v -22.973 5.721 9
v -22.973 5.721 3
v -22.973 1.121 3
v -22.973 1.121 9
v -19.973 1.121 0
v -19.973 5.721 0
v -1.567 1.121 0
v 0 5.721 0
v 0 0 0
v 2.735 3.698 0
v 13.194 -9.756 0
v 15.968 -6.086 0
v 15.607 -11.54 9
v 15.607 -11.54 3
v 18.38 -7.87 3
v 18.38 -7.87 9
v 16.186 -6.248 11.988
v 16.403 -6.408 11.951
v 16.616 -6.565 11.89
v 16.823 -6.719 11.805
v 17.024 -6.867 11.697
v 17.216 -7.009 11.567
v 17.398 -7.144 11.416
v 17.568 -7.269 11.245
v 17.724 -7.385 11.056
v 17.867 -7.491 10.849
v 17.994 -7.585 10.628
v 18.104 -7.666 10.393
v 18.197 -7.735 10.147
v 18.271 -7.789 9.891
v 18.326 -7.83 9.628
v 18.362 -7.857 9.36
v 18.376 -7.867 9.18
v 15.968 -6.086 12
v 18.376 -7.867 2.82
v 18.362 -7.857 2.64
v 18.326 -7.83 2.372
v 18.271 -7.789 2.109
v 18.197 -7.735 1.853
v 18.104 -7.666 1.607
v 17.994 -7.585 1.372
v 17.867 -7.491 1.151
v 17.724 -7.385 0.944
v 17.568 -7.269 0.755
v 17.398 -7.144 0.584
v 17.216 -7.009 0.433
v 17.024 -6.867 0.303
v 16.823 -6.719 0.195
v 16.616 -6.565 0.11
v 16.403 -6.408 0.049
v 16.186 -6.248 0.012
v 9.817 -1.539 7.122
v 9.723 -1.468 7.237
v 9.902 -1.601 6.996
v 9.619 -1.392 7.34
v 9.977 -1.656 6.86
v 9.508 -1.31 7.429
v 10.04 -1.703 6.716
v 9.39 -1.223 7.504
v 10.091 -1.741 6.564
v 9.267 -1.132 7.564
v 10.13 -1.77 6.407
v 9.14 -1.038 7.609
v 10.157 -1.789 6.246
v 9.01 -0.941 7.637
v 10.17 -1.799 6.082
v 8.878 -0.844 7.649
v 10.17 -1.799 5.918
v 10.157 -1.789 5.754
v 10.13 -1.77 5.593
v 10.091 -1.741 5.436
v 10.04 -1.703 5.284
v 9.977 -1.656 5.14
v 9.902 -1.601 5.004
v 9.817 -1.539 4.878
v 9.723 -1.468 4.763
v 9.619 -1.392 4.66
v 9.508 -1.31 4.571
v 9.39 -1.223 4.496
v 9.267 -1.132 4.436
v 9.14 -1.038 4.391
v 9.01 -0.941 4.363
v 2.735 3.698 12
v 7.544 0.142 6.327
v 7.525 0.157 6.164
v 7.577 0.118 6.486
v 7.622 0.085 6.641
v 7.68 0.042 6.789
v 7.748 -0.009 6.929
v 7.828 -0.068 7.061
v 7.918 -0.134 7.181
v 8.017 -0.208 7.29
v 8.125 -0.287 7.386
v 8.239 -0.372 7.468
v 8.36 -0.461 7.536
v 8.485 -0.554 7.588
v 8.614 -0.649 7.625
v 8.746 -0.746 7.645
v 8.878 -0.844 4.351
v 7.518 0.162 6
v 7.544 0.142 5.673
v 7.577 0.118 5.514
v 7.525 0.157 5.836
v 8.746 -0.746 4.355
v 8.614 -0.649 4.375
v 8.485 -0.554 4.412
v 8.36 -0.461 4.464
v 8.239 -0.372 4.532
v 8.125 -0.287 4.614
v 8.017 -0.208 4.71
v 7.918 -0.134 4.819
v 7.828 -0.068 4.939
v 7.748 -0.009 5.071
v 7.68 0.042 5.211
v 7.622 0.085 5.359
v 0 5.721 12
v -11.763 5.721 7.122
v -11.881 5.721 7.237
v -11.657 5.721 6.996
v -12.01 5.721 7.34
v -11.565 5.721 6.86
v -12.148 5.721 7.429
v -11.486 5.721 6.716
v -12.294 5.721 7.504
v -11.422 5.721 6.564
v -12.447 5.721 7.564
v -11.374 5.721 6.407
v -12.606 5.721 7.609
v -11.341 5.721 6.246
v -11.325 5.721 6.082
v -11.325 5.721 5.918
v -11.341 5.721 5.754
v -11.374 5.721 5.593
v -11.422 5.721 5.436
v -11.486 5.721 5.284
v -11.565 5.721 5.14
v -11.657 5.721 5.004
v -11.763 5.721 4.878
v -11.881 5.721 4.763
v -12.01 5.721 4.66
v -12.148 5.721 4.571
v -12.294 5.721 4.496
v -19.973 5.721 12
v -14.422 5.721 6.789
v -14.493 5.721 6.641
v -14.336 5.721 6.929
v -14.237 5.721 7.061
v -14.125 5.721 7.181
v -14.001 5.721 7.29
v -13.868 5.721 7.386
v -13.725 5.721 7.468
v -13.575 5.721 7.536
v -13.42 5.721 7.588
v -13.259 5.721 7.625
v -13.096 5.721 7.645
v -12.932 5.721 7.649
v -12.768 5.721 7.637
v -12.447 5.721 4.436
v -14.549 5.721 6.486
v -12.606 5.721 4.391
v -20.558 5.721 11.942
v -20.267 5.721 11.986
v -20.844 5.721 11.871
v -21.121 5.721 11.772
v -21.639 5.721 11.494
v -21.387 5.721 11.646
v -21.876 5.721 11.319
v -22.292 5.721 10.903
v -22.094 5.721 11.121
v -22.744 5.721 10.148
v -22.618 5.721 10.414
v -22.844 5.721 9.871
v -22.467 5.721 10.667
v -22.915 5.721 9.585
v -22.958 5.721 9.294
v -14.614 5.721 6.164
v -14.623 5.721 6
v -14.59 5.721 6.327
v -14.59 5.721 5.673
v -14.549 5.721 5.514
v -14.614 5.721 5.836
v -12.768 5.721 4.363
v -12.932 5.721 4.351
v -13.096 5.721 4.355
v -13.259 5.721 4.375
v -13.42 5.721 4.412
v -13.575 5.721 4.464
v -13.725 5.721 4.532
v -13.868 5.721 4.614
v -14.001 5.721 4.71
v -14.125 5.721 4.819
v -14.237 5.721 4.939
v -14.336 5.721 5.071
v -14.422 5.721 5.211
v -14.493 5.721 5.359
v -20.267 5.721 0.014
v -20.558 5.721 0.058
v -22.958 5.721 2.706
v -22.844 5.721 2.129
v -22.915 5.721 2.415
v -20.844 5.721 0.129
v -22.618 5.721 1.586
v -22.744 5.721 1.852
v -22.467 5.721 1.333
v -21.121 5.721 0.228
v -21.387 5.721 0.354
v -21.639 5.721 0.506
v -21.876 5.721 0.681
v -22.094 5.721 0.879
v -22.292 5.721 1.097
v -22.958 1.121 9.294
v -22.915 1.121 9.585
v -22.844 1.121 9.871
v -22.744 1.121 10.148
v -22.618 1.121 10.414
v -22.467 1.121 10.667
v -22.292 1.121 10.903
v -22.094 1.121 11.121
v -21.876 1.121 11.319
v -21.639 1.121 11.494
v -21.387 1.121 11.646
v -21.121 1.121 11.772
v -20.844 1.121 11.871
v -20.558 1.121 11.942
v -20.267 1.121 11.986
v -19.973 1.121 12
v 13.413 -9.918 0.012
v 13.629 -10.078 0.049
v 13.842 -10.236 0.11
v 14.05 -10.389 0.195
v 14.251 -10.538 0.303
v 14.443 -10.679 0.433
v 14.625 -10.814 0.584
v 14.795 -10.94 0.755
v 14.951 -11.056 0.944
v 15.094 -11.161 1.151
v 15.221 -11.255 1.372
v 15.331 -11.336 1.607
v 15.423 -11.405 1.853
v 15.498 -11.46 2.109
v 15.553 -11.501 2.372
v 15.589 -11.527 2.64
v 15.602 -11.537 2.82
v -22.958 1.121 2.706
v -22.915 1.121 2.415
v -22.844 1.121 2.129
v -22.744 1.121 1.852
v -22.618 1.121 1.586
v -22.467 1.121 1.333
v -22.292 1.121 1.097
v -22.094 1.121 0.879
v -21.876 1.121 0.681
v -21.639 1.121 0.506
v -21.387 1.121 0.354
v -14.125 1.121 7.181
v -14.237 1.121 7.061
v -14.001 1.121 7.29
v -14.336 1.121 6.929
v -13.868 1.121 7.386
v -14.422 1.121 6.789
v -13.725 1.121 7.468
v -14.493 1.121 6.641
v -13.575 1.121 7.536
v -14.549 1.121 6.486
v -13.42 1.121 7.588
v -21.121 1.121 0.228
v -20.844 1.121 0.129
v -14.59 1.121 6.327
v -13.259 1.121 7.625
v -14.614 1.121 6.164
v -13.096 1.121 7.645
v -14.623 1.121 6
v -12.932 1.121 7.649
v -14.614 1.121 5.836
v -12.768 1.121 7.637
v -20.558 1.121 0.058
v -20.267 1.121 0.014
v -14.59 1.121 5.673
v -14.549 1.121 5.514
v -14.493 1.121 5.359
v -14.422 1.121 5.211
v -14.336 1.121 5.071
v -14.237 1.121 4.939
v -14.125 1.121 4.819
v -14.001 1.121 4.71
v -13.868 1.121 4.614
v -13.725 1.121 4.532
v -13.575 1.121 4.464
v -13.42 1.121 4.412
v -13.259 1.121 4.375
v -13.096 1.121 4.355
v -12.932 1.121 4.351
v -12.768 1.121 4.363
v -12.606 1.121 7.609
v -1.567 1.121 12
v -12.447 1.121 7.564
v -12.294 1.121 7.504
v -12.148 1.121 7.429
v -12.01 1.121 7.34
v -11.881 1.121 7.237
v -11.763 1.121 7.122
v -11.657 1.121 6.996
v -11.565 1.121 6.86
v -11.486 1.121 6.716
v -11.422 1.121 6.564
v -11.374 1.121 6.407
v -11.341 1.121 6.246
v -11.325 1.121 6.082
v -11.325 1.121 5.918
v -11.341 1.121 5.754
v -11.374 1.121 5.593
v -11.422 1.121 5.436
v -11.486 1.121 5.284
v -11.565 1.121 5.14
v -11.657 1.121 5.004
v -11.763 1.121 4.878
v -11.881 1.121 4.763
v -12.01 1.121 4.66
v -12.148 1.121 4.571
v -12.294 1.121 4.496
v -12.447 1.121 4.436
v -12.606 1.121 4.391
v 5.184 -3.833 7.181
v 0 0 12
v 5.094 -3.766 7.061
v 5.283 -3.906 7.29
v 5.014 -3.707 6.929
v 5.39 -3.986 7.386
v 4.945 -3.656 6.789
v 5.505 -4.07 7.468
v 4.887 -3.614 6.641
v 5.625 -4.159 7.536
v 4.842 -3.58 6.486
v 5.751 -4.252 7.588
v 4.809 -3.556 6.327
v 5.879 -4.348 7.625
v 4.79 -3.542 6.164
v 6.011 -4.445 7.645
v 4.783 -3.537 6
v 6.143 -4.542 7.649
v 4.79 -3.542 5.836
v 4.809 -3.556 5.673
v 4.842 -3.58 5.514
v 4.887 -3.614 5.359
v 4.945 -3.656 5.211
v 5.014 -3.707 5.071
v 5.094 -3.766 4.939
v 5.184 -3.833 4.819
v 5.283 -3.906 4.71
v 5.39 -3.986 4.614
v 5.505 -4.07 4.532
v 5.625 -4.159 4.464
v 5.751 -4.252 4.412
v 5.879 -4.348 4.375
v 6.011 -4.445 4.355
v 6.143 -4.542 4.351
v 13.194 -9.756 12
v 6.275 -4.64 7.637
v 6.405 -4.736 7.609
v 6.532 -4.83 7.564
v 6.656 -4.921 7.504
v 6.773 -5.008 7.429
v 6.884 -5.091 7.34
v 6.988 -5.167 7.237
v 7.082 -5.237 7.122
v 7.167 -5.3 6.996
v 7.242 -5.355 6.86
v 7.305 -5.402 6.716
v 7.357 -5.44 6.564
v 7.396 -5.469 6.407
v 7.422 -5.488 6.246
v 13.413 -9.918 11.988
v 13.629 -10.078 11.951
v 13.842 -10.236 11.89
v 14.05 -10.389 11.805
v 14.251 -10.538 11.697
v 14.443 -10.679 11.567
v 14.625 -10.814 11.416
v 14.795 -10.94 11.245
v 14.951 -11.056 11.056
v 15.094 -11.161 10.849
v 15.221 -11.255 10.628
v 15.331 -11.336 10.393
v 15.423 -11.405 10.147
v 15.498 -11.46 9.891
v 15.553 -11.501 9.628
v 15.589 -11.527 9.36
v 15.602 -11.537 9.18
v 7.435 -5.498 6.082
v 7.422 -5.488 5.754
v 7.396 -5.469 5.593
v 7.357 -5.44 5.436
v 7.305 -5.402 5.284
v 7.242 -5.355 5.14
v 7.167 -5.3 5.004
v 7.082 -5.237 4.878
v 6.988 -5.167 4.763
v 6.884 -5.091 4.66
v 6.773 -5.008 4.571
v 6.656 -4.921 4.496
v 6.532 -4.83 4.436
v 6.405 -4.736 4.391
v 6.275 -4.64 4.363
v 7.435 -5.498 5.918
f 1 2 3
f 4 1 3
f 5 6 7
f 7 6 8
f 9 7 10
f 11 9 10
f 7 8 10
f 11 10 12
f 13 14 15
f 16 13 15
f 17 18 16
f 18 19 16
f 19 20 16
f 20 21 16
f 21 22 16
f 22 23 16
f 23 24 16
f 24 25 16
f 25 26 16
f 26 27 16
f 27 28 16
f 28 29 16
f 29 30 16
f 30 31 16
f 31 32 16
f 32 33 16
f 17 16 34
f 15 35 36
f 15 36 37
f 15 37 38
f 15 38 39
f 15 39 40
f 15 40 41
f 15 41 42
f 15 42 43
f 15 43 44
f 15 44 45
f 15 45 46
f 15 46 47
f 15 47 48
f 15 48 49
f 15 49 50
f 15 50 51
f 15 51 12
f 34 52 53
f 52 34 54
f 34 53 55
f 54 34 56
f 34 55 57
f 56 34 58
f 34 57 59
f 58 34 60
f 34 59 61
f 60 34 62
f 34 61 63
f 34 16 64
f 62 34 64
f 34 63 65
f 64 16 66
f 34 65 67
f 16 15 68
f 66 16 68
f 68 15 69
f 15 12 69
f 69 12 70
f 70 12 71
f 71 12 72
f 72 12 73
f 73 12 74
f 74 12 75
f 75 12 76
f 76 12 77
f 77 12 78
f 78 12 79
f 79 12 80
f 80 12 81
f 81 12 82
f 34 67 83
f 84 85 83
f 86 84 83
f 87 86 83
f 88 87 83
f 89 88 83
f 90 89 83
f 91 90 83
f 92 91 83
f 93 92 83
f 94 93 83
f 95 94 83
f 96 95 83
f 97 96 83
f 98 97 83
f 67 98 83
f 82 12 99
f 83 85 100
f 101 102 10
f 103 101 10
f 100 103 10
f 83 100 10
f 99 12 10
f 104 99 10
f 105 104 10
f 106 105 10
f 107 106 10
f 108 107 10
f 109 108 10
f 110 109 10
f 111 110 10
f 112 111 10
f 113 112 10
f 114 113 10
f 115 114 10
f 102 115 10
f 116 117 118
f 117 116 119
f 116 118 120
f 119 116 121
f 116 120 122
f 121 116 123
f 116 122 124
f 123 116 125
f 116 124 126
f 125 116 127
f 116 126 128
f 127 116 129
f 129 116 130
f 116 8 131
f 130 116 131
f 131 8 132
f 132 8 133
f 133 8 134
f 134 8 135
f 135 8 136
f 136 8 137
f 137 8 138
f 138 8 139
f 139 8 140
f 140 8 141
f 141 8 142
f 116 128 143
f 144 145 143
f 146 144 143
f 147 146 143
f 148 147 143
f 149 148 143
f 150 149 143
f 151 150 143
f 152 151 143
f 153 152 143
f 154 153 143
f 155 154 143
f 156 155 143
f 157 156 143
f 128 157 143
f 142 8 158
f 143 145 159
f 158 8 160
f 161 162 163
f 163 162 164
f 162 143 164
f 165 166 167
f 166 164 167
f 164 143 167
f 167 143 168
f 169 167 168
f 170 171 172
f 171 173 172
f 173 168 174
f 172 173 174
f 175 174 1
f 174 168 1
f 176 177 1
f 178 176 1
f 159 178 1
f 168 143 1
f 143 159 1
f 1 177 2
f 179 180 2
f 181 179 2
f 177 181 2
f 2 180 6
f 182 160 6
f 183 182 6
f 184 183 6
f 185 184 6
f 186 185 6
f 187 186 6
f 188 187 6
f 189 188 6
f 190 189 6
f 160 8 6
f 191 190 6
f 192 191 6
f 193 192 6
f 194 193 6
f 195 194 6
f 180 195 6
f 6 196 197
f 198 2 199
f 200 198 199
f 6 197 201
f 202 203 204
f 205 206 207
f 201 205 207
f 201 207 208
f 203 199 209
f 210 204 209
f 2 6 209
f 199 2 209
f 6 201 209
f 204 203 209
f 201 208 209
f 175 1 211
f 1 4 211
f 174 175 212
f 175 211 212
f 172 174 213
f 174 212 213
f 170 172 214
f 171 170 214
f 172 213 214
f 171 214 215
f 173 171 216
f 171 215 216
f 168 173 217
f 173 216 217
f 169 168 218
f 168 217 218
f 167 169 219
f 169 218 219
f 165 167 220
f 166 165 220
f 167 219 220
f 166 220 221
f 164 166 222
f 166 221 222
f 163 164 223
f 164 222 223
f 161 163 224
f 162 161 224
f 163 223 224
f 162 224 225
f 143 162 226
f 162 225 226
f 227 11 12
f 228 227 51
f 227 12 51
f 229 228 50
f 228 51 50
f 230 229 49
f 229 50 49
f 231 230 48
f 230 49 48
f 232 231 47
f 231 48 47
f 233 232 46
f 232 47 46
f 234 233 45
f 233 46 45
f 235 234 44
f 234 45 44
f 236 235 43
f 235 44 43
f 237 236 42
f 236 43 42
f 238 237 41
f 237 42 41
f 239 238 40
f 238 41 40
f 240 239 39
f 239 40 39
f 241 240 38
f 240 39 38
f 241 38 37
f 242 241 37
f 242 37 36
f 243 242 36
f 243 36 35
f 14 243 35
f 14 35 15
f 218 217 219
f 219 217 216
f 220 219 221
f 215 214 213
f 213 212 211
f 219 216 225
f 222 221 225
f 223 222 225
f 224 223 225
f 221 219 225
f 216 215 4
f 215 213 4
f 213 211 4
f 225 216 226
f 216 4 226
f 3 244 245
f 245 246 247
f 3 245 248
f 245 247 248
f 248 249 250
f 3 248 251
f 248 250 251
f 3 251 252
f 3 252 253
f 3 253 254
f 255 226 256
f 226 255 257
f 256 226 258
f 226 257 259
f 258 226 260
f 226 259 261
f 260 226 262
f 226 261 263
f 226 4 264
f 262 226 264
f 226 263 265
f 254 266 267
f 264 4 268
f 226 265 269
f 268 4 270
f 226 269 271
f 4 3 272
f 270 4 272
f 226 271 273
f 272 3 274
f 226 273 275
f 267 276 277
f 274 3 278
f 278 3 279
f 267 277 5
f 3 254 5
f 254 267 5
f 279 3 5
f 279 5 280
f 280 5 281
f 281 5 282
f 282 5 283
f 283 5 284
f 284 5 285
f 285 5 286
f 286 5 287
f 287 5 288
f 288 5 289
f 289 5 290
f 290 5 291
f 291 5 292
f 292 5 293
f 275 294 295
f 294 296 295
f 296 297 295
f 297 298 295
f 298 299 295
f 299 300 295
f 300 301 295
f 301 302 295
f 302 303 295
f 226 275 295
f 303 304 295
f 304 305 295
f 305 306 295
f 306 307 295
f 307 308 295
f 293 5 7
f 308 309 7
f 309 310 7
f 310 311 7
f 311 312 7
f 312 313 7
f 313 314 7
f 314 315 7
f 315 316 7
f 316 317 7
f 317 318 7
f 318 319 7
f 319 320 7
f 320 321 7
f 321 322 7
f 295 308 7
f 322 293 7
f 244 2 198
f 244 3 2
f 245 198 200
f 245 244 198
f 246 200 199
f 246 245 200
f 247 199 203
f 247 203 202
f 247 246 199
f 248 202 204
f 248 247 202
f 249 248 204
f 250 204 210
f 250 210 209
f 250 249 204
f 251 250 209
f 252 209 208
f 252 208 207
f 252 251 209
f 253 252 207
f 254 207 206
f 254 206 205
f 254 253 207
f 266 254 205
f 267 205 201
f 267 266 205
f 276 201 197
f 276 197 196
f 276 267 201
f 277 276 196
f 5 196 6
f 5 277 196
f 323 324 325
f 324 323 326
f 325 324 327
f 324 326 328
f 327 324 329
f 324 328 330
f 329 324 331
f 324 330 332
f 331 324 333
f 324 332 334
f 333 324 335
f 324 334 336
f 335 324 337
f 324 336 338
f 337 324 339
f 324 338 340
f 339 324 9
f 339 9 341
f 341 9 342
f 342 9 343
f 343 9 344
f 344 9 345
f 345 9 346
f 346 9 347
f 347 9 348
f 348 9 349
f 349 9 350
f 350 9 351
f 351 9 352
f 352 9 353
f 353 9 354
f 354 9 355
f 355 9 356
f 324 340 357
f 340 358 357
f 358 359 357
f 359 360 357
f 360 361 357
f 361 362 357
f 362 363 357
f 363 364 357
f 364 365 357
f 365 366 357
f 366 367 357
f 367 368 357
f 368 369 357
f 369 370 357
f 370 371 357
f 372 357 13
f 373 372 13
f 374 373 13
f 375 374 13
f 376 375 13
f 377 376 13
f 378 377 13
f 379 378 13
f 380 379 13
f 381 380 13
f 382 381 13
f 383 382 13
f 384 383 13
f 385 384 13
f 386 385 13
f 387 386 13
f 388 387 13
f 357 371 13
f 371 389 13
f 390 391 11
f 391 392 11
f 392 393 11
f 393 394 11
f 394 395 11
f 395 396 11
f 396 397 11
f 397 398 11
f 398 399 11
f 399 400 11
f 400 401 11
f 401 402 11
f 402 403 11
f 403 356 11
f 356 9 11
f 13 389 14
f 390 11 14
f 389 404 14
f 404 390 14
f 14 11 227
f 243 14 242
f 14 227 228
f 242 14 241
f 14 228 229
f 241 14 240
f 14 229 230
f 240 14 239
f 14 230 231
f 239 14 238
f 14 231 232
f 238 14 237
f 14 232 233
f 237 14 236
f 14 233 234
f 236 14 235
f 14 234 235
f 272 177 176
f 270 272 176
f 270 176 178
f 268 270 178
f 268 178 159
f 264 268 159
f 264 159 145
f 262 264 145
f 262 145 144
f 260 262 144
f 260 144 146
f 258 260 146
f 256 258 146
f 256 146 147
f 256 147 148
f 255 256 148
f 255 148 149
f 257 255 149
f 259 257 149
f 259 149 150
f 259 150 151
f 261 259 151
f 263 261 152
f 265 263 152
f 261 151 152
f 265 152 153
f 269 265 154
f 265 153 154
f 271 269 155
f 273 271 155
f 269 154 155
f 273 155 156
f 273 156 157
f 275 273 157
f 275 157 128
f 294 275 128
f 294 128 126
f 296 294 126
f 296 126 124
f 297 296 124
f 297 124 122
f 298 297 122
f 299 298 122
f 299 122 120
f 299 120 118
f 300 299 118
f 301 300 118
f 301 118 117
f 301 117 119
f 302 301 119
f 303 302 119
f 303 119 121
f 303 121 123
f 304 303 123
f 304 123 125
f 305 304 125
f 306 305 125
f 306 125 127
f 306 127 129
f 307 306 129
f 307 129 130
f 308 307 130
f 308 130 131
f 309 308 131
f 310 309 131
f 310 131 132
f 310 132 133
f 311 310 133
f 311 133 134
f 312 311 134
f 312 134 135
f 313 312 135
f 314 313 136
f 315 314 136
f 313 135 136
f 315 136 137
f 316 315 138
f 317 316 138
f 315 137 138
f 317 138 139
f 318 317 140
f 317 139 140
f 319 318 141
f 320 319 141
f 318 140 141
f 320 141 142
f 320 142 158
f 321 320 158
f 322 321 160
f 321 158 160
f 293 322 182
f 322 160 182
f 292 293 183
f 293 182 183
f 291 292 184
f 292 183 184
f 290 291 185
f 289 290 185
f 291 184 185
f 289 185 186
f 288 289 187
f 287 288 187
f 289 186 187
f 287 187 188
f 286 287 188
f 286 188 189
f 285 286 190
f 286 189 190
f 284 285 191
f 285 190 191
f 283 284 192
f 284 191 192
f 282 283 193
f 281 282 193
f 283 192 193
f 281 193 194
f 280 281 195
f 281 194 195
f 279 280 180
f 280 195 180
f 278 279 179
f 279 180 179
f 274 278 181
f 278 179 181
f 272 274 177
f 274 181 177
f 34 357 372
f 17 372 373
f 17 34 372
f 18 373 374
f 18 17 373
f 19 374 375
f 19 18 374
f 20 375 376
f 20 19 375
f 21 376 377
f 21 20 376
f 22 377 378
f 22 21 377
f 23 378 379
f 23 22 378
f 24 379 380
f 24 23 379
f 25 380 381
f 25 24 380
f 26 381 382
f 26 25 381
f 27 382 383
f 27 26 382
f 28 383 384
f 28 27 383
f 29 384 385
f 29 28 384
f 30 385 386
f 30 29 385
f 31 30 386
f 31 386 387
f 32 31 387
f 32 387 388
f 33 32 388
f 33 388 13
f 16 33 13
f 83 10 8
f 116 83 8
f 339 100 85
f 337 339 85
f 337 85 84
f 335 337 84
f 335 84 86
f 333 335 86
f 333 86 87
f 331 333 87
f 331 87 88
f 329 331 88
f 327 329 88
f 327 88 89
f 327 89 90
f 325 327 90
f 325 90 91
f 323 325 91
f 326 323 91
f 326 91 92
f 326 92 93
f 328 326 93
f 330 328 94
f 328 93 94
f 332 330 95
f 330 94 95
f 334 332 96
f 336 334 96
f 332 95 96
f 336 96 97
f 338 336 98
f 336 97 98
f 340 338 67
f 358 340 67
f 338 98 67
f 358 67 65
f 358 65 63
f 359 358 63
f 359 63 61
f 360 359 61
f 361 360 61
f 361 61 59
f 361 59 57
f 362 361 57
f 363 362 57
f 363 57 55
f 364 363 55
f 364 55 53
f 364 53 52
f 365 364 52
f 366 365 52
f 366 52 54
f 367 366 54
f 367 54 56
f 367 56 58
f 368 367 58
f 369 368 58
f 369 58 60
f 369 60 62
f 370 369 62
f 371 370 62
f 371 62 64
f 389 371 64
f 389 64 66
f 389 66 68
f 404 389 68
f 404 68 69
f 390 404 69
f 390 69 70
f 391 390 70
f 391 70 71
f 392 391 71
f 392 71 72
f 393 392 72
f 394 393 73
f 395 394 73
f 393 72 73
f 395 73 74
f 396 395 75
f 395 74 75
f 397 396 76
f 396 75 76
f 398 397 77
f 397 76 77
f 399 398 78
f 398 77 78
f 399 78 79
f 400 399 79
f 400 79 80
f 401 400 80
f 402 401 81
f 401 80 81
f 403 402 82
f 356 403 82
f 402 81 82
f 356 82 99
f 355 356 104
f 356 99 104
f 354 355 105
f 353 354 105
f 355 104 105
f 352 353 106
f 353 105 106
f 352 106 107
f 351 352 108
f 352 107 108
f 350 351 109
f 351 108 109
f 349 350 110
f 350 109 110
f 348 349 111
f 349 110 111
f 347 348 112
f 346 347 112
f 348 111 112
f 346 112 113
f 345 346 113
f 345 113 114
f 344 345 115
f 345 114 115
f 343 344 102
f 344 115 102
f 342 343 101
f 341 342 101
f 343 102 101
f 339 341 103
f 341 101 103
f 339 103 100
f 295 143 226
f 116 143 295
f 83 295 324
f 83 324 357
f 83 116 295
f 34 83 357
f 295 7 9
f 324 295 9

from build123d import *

# Parameters (mm, degrees)
F1_DEPTH = 12
F2_R     = 1.65
F3_DEPTH = 27.5381246112
F4_R     = 1.65
F5_DEPTH = 17.26183437
F6_R     = 3


# Not quite as in the source:
# - a feature names something its author has since deleted; it is built from what else it names


with BuildPart() as f1:
    # F0 (on Top) → F1 (new body)
    with BuildSketch(Plane.XY):
        Polygon((-22.9726818199, 5.7206649829), (-22.9726818199, 1.1206649829), (-1.5669824788, 1.1206649829), (0.8286588168, 1.1206649829), (2.734780124, 3.6984730734), (0, 5.7206649829), align=None)
        Polygon((2.734780124, 3.6984730734), (0.8286588168, 1.1206649829), (0, 0), (15.6067412389, -11.5401693871), (18.3798691562, -7.870052011), align=None)
        Polygon((0.8286588168, 1.1206649829), (-1.5669824788, 1.1206649829), (0, 0), align=None)
    extrude(amount=F1_DEPTH)

    # F2 (on face) → F3 (cut, through all)
    with BuildSketch(Plane(origin=(2.734780124, 3.6984730734, 0), x_dir=(-0.8040591029, 0.5945493747, 0), z_dir=(0.5945493747, 0.8040591029, 0))):
        with Locations((-7.5987822114, 6)):
            Circle(F2_R)
    extrude(amount=-F3_DEPTH, mode=Mode.SUBTRACT)

    # F4 (on face) → F5 (cut, through all)
    with BuildSketch(Plane(origin=(0, 5.7206649829, 0), x_dir=(-1, 0, 0), z_dir=(0, 1, 0))):
        with Locations((12.9726818199, 6)):
            Circle(F4_R)
    extrude(amount=-F5_DEPTH, mode=Mode.SUBTRACT)

    # F6
    f6_edges = [f1.edges().sort_by_distance(p)[0] for p in [
        (-22.972682, 3.420665, 12),
        (-22.972682, 3.420665, 0),
        (16.993305, -9.705111, 0),
        (16.993305, -9.705111, 12),
    ]]
    fillet(f6_edges, radius=F6_R)


solid = f1.part
